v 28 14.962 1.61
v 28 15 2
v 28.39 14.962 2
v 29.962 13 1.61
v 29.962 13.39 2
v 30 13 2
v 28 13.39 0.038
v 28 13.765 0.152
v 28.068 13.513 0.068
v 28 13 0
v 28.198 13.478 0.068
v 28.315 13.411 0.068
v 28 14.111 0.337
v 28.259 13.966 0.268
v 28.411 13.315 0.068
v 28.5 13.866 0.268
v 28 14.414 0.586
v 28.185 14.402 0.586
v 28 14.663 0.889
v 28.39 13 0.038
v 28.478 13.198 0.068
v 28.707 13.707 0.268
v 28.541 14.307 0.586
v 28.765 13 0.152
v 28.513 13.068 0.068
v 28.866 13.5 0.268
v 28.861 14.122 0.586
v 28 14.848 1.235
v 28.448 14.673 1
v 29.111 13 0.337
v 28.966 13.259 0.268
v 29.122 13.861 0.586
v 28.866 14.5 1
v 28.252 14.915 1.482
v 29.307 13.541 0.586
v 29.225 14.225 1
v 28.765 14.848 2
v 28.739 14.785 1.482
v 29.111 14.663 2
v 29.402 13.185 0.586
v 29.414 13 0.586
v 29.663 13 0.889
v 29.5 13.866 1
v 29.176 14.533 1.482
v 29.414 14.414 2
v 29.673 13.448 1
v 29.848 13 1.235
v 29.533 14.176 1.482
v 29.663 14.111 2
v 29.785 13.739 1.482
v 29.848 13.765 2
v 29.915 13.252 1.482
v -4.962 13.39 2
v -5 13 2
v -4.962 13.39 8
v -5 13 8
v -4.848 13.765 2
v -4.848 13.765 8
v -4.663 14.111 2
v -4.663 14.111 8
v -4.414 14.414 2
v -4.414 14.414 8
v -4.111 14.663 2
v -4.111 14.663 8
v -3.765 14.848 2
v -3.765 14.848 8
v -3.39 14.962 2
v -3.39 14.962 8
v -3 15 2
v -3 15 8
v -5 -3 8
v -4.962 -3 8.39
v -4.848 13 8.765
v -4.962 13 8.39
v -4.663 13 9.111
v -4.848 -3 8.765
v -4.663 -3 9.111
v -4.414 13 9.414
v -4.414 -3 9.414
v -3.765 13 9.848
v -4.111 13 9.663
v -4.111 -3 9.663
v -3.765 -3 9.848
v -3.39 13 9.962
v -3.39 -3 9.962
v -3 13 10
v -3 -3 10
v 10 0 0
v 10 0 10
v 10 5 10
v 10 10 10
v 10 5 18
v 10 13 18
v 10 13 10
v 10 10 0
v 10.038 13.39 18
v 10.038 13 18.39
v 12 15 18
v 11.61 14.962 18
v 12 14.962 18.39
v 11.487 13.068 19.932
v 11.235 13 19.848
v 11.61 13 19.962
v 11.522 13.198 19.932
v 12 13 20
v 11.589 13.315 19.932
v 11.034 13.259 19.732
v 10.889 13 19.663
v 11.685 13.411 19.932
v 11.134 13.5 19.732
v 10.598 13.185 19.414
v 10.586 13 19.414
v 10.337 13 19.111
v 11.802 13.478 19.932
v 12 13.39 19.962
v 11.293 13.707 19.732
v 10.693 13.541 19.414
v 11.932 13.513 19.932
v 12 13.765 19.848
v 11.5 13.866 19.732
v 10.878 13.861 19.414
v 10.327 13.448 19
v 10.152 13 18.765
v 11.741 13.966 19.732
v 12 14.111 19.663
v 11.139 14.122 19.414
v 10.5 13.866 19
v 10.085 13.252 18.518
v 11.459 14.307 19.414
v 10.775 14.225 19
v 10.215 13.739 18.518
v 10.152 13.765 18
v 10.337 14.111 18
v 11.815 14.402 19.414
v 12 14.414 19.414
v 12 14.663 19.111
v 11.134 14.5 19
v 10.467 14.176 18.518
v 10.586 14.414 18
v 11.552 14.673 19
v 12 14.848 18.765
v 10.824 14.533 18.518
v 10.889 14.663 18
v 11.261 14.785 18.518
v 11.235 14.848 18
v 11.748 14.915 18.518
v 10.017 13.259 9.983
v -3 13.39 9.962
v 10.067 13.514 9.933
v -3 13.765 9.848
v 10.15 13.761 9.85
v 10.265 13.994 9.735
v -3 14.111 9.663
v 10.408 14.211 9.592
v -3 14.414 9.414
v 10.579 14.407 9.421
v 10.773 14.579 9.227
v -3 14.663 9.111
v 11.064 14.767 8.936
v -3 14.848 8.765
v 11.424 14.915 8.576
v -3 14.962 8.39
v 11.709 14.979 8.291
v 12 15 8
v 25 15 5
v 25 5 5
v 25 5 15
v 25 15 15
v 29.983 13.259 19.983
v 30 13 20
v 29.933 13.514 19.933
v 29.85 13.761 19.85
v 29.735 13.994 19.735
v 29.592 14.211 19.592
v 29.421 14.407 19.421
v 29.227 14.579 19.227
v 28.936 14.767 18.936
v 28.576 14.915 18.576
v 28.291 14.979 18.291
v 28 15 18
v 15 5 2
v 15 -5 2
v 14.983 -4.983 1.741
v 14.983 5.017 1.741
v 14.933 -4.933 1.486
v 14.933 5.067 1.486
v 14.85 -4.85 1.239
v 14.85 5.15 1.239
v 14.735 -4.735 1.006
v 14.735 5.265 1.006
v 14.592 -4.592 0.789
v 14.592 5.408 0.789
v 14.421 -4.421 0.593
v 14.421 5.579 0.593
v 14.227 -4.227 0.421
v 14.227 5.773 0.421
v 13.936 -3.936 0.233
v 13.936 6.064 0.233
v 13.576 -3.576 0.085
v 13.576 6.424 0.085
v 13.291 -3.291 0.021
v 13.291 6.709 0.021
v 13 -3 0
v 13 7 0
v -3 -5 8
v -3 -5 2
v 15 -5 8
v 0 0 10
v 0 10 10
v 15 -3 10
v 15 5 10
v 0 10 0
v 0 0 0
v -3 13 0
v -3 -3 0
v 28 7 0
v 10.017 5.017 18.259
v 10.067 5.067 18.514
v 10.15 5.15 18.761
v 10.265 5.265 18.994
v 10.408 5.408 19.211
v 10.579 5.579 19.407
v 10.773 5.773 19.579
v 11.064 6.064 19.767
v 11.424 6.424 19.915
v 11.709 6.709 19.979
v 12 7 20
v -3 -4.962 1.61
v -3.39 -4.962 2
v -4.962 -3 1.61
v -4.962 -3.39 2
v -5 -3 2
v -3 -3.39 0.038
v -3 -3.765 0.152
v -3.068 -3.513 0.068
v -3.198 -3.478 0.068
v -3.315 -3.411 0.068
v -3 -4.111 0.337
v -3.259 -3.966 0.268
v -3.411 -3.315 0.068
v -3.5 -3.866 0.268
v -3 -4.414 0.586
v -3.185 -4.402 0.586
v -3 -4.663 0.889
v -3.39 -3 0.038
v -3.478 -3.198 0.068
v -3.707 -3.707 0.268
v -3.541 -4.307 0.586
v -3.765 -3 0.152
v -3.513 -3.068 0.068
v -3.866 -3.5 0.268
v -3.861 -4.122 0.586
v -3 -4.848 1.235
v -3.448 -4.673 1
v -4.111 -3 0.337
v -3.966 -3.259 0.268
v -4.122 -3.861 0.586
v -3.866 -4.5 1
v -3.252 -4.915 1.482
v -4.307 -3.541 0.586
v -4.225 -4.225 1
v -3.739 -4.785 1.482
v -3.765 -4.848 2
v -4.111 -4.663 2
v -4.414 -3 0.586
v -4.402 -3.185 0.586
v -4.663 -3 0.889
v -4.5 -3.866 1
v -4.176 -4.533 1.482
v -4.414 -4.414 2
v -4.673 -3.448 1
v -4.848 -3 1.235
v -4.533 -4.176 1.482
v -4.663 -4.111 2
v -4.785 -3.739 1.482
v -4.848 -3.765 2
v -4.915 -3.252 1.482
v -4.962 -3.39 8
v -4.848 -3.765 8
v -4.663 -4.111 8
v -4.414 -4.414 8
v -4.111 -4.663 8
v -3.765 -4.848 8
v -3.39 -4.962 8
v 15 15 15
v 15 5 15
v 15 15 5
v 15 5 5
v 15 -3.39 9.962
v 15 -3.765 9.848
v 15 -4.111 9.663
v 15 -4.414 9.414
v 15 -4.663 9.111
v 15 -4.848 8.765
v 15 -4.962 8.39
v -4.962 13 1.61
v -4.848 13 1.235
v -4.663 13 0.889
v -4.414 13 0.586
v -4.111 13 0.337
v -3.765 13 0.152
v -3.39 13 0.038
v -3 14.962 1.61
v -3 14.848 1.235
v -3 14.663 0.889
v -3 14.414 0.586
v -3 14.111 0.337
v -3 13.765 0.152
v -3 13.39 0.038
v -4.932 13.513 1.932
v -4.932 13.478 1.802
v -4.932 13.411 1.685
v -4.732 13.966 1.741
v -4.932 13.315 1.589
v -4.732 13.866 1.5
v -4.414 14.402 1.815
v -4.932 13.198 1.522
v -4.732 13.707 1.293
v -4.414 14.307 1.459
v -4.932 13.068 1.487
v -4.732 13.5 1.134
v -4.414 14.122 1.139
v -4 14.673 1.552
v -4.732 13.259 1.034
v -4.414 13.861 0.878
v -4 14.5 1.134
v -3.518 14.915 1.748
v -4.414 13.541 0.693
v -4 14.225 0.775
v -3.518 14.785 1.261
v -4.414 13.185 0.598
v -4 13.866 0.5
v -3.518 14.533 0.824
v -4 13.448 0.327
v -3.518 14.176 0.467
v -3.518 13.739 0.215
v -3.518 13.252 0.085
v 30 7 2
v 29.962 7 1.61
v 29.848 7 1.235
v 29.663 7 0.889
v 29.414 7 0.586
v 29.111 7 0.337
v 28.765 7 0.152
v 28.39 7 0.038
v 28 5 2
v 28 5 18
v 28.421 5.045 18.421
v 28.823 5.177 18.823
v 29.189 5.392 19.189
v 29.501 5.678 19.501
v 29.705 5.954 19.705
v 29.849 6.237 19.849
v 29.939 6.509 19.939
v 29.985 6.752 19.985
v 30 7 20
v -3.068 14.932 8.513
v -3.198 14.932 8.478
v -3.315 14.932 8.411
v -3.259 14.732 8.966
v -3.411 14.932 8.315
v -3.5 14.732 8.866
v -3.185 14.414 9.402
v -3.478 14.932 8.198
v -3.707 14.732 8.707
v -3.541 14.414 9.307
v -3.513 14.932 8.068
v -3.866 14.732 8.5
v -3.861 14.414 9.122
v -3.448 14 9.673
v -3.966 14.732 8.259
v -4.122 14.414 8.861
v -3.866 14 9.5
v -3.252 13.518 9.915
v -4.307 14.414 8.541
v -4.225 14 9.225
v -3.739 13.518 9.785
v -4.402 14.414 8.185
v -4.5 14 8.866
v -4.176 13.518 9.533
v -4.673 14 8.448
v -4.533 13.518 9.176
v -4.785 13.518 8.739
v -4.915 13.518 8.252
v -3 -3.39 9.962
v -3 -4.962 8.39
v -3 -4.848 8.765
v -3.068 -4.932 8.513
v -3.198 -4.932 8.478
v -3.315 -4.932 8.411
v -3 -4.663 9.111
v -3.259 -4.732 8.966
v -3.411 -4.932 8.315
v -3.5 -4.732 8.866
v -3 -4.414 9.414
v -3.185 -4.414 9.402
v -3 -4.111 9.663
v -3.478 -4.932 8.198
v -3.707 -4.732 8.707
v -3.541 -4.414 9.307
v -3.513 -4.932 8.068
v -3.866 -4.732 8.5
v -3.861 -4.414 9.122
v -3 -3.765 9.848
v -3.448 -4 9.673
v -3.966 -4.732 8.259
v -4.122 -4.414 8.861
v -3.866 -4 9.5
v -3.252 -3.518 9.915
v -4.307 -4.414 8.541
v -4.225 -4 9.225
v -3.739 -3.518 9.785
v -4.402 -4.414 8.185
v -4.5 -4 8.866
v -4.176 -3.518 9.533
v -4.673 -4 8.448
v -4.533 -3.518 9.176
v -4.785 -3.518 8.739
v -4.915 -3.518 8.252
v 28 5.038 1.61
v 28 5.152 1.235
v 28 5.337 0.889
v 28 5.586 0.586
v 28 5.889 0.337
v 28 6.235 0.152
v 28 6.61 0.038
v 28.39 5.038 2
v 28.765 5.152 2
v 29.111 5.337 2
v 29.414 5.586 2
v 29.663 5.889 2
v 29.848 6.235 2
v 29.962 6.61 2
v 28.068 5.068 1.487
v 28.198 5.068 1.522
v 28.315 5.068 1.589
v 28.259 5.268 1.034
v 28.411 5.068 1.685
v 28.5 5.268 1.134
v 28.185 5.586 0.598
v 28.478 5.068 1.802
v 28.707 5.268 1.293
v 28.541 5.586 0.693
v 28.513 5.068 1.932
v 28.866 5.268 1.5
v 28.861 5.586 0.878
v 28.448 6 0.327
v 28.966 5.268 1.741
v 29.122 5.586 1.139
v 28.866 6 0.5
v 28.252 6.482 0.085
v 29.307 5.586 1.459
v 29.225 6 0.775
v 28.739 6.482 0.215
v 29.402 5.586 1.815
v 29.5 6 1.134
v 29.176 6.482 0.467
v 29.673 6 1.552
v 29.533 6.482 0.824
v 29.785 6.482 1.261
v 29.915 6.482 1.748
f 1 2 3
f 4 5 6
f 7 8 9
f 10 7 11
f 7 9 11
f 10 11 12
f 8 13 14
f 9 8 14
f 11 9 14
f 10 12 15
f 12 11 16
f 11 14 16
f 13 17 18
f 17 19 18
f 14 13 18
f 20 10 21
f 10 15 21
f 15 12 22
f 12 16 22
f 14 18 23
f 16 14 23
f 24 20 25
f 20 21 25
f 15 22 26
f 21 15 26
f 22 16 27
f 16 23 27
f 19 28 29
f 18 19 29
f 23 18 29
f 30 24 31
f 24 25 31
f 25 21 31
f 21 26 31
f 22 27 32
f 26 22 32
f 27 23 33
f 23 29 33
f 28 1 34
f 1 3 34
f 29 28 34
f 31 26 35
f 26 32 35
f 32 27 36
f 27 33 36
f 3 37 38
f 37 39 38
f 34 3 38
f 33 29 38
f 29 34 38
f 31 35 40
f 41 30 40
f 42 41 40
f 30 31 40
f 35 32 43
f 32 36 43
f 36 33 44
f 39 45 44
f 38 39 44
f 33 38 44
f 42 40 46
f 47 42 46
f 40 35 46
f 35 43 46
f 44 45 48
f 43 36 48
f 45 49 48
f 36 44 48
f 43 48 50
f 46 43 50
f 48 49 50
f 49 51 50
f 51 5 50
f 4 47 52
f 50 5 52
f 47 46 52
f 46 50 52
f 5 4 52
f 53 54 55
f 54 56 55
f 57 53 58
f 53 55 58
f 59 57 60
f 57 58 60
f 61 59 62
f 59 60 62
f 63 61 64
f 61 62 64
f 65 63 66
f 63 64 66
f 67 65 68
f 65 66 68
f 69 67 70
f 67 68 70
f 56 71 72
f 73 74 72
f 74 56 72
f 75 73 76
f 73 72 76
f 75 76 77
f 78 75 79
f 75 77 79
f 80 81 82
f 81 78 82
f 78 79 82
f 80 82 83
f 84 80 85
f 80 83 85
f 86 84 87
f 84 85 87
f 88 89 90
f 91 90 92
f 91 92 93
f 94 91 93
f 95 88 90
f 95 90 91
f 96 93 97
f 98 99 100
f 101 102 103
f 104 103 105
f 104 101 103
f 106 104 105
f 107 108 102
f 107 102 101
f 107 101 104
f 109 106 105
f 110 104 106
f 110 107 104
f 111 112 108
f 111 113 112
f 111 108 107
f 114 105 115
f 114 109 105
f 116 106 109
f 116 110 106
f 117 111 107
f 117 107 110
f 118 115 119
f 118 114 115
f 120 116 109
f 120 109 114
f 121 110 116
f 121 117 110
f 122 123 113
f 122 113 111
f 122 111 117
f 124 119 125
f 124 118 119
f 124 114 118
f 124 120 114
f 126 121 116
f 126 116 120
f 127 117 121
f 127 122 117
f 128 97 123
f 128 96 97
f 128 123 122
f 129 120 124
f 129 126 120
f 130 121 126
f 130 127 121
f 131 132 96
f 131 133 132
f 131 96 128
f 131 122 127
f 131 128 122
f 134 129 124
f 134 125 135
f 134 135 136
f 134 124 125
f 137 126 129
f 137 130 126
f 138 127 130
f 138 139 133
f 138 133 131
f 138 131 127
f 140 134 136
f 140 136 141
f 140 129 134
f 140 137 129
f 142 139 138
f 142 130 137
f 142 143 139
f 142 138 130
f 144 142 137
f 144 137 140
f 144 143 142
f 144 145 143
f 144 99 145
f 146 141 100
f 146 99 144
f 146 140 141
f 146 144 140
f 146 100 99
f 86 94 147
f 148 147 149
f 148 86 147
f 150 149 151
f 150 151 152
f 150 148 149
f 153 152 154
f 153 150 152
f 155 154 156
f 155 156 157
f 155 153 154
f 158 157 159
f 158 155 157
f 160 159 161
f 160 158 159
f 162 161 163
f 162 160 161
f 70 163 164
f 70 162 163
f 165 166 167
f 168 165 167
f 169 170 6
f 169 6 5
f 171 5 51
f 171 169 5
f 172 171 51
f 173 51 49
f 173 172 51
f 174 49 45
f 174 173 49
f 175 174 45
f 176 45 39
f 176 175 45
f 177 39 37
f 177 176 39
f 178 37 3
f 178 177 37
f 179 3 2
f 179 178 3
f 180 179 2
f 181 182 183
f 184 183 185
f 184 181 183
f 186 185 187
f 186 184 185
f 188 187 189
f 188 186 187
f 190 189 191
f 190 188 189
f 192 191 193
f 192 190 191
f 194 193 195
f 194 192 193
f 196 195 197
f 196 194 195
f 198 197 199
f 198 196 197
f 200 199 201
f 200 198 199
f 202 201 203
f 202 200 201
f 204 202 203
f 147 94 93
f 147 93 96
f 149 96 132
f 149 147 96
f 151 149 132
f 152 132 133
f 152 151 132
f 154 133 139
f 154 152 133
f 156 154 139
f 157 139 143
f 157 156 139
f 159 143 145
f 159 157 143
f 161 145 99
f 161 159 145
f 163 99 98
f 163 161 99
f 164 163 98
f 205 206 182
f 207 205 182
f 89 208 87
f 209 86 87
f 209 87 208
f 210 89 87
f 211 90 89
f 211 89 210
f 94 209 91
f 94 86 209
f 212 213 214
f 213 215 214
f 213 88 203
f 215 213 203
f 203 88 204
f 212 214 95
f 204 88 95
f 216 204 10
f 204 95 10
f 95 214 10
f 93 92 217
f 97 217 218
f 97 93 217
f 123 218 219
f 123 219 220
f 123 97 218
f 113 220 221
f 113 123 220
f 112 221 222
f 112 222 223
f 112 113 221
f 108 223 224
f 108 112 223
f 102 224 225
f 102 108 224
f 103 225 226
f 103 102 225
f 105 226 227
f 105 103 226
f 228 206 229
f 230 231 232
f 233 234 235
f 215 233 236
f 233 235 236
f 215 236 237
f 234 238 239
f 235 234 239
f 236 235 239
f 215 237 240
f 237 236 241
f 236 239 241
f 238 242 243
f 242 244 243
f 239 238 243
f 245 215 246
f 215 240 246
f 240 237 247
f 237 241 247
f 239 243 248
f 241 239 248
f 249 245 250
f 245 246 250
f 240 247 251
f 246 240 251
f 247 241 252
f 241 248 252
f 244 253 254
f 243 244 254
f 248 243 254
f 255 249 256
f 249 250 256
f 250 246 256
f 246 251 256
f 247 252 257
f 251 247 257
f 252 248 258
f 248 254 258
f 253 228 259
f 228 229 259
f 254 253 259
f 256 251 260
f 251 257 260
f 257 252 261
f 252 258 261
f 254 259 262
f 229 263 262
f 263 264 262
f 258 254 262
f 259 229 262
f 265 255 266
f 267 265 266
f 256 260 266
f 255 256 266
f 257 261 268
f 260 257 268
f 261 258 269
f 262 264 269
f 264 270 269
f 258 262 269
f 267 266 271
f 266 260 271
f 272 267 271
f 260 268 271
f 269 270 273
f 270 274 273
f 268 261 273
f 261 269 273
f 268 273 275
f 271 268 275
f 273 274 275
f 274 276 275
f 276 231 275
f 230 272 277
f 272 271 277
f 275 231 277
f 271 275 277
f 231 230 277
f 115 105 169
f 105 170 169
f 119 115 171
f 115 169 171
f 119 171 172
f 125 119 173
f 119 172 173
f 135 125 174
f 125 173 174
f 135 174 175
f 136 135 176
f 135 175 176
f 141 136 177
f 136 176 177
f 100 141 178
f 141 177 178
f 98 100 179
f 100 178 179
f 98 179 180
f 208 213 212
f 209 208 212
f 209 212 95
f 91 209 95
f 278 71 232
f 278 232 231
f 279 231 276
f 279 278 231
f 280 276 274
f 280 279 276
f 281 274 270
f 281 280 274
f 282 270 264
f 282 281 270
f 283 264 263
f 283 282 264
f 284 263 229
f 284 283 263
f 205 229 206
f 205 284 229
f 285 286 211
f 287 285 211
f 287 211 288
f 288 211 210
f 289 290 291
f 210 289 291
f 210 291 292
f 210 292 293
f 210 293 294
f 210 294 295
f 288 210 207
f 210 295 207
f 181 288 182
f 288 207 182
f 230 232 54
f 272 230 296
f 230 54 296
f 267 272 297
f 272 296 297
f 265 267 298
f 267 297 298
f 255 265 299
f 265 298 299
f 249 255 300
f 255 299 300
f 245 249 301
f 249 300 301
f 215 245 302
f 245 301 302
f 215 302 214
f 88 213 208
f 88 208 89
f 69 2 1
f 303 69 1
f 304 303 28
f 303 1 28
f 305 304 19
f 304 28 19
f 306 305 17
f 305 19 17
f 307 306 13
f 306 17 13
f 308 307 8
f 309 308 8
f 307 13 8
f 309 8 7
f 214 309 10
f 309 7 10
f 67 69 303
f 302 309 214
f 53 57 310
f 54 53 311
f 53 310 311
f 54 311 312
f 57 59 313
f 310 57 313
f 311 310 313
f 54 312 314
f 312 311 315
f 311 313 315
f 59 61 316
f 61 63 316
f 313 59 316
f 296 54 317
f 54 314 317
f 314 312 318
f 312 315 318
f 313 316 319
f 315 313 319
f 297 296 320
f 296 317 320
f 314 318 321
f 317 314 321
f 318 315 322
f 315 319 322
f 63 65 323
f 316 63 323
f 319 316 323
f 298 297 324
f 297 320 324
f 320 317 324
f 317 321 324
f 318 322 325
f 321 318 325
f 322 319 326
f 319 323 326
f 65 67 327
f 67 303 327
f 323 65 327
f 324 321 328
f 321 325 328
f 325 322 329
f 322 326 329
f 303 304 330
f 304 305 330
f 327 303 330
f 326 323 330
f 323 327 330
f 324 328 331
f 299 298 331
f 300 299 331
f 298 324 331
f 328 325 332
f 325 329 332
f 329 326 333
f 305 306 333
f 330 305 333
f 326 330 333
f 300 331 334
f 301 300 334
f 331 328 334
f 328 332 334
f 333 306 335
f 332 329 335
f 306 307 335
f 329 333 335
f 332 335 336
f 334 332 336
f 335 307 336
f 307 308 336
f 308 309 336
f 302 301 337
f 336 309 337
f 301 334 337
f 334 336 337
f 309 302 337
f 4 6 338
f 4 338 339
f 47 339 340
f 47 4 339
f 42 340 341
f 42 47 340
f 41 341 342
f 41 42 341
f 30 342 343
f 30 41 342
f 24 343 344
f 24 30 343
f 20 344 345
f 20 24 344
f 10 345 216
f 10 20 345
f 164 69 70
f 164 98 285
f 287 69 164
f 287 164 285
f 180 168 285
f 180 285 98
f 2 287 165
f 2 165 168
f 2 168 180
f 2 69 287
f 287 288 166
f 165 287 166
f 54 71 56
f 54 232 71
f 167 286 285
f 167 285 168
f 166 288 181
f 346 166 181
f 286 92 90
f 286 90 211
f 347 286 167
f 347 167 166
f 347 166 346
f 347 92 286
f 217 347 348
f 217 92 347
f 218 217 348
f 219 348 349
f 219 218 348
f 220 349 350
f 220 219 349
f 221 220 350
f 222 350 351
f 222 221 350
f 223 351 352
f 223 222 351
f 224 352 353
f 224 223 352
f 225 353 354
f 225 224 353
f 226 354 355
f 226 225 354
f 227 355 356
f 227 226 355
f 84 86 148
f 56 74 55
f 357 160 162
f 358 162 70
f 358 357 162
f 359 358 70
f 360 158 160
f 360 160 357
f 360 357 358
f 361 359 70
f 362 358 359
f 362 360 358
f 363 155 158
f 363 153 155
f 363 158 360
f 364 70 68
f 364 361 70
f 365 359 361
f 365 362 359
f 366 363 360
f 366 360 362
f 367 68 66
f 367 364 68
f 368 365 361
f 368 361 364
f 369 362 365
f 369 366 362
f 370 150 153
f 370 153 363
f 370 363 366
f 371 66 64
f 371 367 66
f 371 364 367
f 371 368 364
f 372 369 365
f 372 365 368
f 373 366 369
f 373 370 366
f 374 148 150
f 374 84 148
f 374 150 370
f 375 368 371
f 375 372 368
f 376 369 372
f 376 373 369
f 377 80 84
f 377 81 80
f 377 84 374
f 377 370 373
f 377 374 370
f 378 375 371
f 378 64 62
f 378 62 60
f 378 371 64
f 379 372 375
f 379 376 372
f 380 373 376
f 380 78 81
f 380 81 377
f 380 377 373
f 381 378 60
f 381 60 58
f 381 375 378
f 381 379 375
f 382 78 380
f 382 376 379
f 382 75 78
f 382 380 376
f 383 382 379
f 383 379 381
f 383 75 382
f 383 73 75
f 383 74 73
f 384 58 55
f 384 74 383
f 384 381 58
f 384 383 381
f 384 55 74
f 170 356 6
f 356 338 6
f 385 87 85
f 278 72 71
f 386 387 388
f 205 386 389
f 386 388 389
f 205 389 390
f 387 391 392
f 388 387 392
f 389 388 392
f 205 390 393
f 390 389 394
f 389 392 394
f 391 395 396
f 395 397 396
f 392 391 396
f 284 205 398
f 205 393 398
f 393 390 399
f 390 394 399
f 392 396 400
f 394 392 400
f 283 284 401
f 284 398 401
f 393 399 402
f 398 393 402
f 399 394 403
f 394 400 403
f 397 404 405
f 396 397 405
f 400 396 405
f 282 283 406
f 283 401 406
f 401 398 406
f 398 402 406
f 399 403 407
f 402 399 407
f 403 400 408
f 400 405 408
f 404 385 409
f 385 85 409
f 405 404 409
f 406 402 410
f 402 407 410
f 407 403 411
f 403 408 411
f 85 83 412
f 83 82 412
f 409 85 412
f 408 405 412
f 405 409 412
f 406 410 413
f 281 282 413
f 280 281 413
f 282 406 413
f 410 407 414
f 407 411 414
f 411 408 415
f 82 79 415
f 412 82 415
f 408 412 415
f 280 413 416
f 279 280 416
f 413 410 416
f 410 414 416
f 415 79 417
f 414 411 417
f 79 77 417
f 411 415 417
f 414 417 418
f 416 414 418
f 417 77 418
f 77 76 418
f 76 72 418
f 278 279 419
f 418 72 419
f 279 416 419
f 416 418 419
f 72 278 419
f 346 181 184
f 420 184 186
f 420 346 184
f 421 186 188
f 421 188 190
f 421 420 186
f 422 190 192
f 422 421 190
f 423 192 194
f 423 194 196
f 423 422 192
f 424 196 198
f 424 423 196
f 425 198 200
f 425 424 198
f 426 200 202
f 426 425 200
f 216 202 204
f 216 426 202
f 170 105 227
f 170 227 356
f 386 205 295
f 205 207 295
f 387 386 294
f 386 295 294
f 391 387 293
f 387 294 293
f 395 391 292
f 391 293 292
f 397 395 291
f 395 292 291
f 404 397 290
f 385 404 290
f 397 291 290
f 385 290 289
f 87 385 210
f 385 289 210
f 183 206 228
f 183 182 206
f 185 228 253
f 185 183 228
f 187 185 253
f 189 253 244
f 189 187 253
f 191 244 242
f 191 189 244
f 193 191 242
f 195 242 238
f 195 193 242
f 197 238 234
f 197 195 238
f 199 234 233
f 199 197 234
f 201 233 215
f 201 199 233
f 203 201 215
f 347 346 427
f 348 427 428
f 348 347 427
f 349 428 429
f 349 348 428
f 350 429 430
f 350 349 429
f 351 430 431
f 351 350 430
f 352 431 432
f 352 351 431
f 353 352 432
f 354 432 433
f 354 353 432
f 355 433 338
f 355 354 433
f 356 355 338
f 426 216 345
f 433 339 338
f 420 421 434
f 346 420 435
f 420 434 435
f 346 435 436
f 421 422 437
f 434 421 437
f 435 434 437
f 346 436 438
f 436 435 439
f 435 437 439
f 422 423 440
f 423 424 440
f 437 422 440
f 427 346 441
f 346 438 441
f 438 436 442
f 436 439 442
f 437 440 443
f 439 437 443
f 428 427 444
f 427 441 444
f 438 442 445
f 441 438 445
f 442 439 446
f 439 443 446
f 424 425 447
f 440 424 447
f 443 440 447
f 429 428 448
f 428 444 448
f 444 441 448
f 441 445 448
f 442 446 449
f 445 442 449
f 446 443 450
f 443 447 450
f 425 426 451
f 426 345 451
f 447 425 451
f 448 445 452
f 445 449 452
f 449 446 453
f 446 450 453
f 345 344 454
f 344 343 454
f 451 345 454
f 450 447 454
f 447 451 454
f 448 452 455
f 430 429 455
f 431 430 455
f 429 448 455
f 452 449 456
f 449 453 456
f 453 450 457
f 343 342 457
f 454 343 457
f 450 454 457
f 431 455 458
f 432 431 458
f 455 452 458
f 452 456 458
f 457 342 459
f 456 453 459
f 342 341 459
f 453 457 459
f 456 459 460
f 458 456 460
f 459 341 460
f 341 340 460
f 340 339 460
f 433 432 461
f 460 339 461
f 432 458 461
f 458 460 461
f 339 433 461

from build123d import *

# Parameters (mm, degrees)
F0_W     = 35
F0_H     = 20
F0_W_2   = 10
F0_H_2   = 10
F1_DEPTH = 20
F2_W     = 10
F2_H     = 5
F3_DEPTH = 25
F5_DEPTH = 10
F6_DEPTH = 10
F7_R     = 2


with BuildPart() as f1:
    # F0 (on Top) → F1 (new body)
    with BuildSketch(Plane.XY):
        with Locations((12.5, 5)):
            Rectangle(F0_W, F0_H)
        with Locations((5, 5)):
            Rectangle(F0_W_2, F0_H_2, mode=Mode.SUBTRACT)
    extrude(amount=F1_DEPTH)

    # F2 (on face) → F3 (cut)
    with BuildSketch(Plane.XZ.offset(5)):
        with Locations((20, 12.5)):
            Rectangle(F2_W, F2_H)
        with Locations((20, 7.5)):
            Rectangle(F2_W, F2_H)
    extrude(amount=-F3_DEPTH, mode=Mode.SUBTRACT)

    # F4 (on face) → F5 (cut)
    with BuildSketch(Plane.XY.offset(20)):
        Polygon((10, 10), (10, 15), (-5, 15), (-5, -5), (10, -5), (10, 0), (0, 0), (0, 10), align=None)
    extrude(amount=-F5_DEPTH, mode=Mode.SUBTRACT)

    # F2 (on face) → F6 (cut)
    with BuildSketch(Plane.XZ.offset(5)):
        Polygon((15, 10), (15, 15), (25, 15), (25, 10), (30, 10), (30, 20), (10, 20), (10, 10), align=None)
        Polygon((30, 10), (25, 10), (25, 5), (15, 5), (15, 0), (30, 0), align=None)
    extrude(amount=-F6_DEPTH, mode=Mode.SUBTRACT)

    # F7
    f7_edges = [f1.edges().sort_by_distance(p)[0] for p in [
        (-5, 5, 10),
        (5, -5, 10),
        (2.5, 15, 10),
        (10, 15, 15),
        (10, 10, 20),
        (20, 15, 20),
        (30, 15, 10),
        (12.5, 15, 0),
        (-5, 15, 5),
        (-5, -5, 5),
        (30, 10, 0),
        (22.5, 5, 0),
        (15, 0, 0),
        (30, 5, 10),
        (20, 5, 20),
        (5, -5, 0),
        (-5, 5, 0),
    ]]
    fillet(f7_edges, radius=F7_R)


solid = f1.part
